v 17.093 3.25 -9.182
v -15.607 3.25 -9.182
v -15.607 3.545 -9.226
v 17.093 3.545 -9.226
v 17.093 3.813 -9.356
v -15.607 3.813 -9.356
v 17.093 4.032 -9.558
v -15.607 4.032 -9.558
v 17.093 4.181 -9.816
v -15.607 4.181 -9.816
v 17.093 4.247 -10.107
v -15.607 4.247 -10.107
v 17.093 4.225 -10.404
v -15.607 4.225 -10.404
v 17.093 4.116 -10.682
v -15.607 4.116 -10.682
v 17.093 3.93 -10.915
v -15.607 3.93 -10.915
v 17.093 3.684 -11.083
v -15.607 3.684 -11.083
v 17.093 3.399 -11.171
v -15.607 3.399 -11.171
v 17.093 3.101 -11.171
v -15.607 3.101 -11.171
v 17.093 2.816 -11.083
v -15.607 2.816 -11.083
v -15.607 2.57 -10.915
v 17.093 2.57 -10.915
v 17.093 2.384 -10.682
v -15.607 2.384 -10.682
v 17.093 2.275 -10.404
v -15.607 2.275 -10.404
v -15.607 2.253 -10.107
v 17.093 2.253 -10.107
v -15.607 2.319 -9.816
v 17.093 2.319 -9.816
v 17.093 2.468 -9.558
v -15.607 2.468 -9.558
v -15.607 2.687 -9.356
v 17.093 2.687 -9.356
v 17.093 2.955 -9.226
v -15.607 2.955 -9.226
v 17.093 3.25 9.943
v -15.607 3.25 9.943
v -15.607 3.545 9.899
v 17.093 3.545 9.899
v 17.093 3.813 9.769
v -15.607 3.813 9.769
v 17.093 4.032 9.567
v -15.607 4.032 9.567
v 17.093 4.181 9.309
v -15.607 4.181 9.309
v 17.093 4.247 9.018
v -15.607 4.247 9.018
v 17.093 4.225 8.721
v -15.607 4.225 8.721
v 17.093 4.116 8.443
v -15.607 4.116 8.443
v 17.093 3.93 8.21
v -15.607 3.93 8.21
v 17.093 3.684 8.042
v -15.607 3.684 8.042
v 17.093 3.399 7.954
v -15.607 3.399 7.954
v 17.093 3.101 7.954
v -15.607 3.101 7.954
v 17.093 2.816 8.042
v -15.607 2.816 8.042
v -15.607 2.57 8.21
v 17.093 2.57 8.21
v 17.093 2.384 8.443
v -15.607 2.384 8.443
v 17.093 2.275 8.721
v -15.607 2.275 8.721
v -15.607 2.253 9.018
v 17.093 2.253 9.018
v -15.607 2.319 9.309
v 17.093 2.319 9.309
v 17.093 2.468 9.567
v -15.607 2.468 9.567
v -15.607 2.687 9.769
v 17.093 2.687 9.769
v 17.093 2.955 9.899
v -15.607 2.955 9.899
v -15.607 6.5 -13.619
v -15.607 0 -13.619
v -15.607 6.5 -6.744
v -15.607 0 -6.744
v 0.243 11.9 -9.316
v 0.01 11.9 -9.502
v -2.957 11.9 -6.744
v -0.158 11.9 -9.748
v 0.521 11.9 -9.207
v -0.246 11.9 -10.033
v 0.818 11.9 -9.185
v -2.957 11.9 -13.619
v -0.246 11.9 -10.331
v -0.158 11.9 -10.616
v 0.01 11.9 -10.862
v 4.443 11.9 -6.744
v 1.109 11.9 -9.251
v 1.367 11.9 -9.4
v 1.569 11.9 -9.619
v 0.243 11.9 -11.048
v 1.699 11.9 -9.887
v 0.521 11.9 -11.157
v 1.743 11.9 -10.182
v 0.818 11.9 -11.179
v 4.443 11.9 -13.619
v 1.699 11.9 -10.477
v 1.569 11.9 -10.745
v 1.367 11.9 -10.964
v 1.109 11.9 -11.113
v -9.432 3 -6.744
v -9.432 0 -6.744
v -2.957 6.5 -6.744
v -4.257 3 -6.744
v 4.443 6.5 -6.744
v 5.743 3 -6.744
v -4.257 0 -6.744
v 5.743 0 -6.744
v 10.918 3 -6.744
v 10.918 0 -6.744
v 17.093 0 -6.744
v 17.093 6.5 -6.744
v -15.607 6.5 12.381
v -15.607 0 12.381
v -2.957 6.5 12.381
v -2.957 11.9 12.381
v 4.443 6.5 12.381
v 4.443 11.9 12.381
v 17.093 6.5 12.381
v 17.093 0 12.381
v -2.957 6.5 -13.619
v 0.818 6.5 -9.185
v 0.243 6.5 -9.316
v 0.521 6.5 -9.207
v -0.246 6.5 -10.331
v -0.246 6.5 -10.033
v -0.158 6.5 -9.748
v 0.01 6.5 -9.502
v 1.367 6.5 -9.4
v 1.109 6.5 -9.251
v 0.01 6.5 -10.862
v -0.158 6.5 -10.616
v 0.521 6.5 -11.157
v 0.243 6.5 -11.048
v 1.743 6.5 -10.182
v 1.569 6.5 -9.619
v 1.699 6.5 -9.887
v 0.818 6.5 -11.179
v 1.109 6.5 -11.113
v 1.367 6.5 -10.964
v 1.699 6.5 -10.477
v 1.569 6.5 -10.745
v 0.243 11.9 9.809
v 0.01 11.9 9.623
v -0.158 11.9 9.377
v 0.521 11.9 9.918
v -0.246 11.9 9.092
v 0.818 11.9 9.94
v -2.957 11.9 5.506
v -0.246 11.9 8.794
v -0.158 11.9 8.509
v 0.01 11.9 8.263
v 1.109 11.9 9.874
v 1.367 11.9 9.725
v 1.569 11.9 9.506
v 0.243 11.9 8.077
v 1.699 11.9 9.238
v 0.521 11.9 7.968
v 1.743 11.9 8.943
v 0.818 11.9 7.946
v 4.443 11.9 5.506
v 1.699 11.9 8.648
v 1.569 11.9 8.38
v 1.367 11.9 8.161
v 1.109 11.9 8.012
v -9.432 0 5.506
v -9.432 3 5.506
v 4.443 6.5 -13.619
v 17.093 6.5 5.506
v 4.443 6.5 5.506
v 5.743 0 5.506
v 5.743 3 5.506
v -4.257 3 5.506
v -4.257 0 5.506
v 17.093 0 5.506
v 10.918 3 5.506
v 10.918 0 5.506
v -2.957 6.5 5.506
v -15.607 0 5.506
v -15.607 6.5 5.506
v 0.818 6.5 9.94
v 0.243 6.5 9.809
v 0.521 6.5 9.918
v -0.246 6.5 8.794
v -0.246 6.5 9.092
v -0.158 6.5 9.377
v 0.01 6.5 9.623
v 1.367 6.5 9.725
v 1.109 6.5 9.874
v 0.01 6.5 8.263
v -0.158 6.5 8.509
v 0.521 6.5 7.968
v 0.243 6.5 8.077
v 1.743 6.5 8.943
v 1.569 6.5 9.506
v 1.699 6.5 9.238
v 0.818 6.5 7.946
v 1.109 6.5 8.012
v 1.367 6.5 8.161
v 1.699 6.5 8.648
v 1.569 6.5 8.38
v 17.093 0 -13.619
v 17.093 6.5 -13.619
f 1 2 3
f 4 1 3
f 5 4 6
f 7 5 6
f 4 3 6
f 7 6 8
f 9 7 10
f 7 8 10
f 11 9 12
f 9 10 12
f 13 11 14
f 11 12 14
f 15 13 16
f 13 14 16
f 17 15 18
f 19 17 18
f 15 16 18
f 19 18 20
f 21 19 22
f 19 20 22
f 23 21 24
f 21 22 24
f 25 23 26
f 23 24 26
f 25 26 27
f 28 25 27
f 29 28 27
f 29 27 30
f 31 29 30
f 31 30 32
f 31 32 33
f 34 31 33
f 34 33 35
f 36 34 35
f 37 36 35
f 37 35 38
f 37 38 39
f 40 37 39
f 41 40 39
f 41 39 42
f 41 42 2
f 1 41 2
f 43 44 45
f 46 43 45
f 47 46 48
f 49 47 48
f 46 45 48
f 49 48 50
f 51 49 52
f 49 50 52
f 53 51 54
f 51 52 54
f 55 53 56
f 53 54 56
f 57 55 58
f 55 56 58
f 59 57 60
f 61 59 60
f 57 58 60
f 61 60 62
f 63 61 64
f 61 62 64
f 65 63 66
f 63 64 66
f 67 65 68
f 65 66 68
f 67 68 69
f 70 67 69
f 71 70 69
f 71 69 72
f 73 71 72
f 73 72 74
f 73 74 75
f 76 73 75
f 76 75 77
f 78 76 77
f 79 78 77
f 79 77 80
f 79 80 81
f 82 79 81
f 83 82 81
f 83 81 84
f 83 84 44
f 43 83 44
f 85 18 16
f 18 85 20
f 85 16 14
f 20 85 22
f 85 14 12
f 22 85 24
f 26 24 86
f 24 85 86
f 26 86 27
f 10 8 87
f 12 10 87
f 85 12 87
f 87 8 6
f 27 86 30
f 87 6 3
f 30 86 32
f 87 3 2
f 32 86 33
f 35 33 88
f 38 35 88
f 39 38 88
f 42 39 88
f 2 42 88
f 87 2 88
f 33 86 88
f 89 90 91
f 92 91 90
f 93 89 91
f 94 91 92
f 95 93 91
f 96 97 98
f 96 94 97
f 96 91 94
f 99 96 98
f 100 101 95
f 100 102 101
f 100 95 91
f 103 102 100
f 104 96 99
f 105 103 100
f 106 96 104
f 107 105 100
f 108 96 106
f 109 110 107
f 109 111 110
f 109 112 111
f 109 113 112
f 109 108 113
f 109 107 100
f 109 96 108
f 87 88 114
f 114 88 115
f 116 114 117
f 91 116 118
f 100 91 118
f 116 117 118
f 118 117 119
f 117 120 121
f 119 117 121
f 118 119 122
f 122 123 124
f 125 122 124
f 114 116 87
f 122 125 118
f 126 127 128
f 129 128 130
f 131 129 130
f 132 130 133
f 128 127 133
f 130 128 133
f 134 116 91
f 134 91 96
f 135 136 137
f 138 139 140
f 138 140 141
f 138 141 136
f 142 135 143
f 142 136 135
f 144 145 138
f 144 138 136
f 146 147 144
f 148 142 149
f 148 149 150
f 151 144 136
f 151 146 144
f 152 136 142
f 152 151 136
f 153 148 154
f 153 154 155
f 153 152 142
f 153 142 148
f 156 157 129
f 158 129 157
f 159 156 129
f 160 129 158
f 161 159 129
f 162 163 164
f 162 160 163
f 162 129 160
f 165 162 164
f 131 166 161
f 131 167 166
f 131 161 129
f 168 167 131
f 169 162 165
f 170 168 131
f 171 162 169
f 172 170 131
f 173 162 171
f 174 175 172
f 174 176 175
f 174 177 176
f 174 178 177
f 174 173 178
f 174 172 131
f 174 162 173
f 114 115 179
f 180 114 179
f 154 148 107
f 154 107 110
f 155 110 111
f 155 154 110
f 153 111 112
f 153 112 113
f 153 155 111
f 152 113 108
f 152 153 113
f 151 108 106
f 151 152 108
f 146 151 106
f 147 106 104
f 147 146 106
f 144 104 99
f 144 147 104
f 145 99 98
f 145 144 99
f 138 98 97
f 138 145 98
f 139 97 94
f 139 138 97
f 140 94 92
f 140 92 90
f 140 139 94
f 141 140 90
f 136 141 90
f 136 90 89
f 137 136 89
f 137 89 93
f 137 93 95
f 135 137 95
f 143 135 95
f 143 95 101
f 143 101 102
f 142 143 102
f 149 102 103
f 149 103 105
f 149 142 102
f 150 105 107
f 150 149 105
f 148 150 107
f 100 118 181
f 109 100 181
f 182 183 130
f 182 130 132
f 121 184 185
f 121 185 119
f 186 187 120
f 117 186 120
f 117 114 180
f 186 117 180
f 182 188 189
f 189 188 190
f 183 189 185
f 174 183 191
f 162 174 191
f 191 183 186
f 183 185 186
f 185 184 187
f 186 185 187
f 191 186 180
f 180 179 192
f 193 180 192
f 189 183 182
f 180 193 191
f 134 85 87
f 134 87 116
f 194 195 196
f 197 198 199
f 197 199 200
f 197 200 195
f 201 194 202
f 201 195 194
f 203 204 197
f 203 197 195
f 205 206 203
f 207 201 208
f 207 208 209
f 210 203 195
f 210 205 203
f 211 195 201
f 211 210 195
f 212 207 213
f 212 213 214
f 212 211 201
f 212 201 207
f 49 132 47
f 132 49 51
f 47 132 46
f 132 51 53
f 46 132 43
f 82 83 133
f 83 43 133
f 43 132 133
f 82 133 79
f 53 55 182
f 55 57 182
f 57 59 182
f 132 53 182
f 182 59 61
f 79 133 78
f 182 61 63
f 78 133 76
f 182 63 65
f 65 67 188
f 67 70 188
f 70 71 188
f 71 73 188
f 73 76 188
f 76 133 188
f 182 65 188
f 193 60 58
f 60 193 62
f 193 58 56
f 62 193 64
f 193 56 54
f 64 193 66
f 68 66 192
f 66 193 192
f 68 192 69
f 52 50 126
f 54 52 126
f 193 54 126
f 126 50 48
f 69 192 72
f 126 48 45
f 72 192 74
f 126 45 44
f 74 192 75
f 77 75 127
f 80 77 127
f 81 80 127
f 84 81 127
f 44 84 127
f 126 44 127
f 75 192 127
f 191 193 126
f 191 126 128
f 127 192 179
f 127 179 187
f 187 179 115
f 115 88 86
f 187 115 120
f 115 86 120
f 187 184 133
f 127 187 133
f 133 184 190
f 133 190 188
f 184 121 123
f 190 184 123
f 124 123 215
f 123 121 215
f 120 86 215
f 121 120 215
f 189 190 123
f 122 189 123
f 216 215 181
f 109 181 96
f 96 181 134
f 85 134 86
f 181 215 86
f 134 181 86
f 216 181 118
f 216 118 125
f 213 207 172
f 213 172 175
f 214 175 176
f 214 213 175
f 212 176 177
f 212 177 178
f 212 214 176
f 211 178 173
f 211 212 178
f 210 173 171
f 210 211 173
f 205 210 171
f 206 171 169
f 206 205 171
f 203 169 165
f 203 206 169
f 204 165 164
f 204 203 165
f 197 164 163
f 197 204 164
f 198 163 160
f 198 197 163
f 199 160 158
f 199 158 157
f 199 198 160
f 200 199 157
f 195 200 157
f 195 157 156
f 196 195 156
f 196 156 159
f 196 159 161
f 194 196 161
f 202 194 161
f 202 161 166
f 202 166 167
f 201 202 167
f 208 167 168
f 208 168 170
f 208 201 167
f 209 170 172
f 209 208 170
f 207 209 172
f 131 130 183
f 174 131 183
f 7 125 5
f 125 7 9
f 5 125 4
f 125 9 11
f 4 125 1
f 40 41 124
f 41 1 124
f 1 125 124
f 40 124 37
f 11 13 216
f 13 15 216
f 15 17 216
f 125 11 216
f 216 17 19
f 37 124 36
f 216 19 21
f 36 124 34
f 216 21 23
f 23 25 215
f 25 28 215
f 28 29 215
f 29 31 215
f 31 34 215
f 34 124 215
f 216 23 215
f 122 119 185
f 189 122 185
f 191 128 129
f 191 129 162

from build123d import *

# Parameters (mm, degrees)
CROQUIS1_W              = 10
CROQUIS1_H              = 12.25
SALIENTE_EXTRUIR1_DEPTH = 6.5
CROQUIS2_W              = 7.4
CROQUIS2_H              = 6.875
CROQUIS2_R              = 1
SALIENTE_EXTRUIR2_DEPTH = 5.4
CROQUIS3_R              = 1
CROQUIS3_W              = 12.25
CROQUIS3_H              = 3.5
CORTAR_EXTRUIR1_DEPTH   = 35.4


with BuildPart() as part:
    # Croquis1 → Saliente-Extruir1 (new body)
    with BuildSketch(Plane(origin=(0, 0, 0), x_dir=(1, 0, 0), z_dir=(0, 1, 0))):
        Polygon((-15.606807411, 13.619327476), (-15.606807411, 6.744327476), (-9.43180722, 6.744327476), (-9.43180722, -5.505672524), (-15.606807411, -5.505672524), (-15.606807411, -12.380672524), (17.093193352, -12.380672524), (17.093193352, -5.505672524), (10.918193161, -5.505672524), (10.918193161, 6.744327476), (17.093193352, 6.744327476), (17.093193352, 13.619327476), align=None)
        with Locations((0.743192971, 0.619327476)):
            Rectangle(CROQUIS1_W, CROQUIS1_H, mode=Mode.SUBTRACT)
    extrude(amount=SALIENTE_EXTRUIR1_DEPTH)

    # Croquis2 → Saliente-Extruir2 (add)
    with BuildSketch(Plane(origin=(0, 6.5, 0), x_dir=(1, 0, 0), z_dir=(0, 1, 0))):
        with Locations((0.743192971, -8.943172524)):
            Rectangle(CROQUIS2_W, CROQUIS2_H)
        with Locations((0.743192971, -8.943172524)):
            Circle(CROQUIS2_R, mode=Mode.SUBTRACT)
        with Locations((0.743192971, 10.181827476)):
            Rectangle(CROQUIS2_W, CROQUIS2_H)
        with Locations((0.743192971, 10.181827476)):
            Circle(CROQUIS2_R, mode=Mode.SUBTRACT)
    extrude(amount=SALIENTE_EXTRUIR2_DEPTH)

    # Croquis3 → Cortar-Extruir1 (cut)
    with BuildSketch(Plane.ZY.offset(15.606807411)):
        with Locations((-10.181827476, 3.25)):
            Circle(CROQUIS3_R)
        with Locations((8.943172524, 3.25)):
            Circle(CROQUIS3_R)
        with Locations((-0.619327476, 4.75)):
            Rectangle(CROQUIS3_W, CROQUIS3_H)
    extrude(amount=-CORTAR_EXTRUIR1_DEPTH, mode=Mode.SUBTRACT)


solid = part.part
